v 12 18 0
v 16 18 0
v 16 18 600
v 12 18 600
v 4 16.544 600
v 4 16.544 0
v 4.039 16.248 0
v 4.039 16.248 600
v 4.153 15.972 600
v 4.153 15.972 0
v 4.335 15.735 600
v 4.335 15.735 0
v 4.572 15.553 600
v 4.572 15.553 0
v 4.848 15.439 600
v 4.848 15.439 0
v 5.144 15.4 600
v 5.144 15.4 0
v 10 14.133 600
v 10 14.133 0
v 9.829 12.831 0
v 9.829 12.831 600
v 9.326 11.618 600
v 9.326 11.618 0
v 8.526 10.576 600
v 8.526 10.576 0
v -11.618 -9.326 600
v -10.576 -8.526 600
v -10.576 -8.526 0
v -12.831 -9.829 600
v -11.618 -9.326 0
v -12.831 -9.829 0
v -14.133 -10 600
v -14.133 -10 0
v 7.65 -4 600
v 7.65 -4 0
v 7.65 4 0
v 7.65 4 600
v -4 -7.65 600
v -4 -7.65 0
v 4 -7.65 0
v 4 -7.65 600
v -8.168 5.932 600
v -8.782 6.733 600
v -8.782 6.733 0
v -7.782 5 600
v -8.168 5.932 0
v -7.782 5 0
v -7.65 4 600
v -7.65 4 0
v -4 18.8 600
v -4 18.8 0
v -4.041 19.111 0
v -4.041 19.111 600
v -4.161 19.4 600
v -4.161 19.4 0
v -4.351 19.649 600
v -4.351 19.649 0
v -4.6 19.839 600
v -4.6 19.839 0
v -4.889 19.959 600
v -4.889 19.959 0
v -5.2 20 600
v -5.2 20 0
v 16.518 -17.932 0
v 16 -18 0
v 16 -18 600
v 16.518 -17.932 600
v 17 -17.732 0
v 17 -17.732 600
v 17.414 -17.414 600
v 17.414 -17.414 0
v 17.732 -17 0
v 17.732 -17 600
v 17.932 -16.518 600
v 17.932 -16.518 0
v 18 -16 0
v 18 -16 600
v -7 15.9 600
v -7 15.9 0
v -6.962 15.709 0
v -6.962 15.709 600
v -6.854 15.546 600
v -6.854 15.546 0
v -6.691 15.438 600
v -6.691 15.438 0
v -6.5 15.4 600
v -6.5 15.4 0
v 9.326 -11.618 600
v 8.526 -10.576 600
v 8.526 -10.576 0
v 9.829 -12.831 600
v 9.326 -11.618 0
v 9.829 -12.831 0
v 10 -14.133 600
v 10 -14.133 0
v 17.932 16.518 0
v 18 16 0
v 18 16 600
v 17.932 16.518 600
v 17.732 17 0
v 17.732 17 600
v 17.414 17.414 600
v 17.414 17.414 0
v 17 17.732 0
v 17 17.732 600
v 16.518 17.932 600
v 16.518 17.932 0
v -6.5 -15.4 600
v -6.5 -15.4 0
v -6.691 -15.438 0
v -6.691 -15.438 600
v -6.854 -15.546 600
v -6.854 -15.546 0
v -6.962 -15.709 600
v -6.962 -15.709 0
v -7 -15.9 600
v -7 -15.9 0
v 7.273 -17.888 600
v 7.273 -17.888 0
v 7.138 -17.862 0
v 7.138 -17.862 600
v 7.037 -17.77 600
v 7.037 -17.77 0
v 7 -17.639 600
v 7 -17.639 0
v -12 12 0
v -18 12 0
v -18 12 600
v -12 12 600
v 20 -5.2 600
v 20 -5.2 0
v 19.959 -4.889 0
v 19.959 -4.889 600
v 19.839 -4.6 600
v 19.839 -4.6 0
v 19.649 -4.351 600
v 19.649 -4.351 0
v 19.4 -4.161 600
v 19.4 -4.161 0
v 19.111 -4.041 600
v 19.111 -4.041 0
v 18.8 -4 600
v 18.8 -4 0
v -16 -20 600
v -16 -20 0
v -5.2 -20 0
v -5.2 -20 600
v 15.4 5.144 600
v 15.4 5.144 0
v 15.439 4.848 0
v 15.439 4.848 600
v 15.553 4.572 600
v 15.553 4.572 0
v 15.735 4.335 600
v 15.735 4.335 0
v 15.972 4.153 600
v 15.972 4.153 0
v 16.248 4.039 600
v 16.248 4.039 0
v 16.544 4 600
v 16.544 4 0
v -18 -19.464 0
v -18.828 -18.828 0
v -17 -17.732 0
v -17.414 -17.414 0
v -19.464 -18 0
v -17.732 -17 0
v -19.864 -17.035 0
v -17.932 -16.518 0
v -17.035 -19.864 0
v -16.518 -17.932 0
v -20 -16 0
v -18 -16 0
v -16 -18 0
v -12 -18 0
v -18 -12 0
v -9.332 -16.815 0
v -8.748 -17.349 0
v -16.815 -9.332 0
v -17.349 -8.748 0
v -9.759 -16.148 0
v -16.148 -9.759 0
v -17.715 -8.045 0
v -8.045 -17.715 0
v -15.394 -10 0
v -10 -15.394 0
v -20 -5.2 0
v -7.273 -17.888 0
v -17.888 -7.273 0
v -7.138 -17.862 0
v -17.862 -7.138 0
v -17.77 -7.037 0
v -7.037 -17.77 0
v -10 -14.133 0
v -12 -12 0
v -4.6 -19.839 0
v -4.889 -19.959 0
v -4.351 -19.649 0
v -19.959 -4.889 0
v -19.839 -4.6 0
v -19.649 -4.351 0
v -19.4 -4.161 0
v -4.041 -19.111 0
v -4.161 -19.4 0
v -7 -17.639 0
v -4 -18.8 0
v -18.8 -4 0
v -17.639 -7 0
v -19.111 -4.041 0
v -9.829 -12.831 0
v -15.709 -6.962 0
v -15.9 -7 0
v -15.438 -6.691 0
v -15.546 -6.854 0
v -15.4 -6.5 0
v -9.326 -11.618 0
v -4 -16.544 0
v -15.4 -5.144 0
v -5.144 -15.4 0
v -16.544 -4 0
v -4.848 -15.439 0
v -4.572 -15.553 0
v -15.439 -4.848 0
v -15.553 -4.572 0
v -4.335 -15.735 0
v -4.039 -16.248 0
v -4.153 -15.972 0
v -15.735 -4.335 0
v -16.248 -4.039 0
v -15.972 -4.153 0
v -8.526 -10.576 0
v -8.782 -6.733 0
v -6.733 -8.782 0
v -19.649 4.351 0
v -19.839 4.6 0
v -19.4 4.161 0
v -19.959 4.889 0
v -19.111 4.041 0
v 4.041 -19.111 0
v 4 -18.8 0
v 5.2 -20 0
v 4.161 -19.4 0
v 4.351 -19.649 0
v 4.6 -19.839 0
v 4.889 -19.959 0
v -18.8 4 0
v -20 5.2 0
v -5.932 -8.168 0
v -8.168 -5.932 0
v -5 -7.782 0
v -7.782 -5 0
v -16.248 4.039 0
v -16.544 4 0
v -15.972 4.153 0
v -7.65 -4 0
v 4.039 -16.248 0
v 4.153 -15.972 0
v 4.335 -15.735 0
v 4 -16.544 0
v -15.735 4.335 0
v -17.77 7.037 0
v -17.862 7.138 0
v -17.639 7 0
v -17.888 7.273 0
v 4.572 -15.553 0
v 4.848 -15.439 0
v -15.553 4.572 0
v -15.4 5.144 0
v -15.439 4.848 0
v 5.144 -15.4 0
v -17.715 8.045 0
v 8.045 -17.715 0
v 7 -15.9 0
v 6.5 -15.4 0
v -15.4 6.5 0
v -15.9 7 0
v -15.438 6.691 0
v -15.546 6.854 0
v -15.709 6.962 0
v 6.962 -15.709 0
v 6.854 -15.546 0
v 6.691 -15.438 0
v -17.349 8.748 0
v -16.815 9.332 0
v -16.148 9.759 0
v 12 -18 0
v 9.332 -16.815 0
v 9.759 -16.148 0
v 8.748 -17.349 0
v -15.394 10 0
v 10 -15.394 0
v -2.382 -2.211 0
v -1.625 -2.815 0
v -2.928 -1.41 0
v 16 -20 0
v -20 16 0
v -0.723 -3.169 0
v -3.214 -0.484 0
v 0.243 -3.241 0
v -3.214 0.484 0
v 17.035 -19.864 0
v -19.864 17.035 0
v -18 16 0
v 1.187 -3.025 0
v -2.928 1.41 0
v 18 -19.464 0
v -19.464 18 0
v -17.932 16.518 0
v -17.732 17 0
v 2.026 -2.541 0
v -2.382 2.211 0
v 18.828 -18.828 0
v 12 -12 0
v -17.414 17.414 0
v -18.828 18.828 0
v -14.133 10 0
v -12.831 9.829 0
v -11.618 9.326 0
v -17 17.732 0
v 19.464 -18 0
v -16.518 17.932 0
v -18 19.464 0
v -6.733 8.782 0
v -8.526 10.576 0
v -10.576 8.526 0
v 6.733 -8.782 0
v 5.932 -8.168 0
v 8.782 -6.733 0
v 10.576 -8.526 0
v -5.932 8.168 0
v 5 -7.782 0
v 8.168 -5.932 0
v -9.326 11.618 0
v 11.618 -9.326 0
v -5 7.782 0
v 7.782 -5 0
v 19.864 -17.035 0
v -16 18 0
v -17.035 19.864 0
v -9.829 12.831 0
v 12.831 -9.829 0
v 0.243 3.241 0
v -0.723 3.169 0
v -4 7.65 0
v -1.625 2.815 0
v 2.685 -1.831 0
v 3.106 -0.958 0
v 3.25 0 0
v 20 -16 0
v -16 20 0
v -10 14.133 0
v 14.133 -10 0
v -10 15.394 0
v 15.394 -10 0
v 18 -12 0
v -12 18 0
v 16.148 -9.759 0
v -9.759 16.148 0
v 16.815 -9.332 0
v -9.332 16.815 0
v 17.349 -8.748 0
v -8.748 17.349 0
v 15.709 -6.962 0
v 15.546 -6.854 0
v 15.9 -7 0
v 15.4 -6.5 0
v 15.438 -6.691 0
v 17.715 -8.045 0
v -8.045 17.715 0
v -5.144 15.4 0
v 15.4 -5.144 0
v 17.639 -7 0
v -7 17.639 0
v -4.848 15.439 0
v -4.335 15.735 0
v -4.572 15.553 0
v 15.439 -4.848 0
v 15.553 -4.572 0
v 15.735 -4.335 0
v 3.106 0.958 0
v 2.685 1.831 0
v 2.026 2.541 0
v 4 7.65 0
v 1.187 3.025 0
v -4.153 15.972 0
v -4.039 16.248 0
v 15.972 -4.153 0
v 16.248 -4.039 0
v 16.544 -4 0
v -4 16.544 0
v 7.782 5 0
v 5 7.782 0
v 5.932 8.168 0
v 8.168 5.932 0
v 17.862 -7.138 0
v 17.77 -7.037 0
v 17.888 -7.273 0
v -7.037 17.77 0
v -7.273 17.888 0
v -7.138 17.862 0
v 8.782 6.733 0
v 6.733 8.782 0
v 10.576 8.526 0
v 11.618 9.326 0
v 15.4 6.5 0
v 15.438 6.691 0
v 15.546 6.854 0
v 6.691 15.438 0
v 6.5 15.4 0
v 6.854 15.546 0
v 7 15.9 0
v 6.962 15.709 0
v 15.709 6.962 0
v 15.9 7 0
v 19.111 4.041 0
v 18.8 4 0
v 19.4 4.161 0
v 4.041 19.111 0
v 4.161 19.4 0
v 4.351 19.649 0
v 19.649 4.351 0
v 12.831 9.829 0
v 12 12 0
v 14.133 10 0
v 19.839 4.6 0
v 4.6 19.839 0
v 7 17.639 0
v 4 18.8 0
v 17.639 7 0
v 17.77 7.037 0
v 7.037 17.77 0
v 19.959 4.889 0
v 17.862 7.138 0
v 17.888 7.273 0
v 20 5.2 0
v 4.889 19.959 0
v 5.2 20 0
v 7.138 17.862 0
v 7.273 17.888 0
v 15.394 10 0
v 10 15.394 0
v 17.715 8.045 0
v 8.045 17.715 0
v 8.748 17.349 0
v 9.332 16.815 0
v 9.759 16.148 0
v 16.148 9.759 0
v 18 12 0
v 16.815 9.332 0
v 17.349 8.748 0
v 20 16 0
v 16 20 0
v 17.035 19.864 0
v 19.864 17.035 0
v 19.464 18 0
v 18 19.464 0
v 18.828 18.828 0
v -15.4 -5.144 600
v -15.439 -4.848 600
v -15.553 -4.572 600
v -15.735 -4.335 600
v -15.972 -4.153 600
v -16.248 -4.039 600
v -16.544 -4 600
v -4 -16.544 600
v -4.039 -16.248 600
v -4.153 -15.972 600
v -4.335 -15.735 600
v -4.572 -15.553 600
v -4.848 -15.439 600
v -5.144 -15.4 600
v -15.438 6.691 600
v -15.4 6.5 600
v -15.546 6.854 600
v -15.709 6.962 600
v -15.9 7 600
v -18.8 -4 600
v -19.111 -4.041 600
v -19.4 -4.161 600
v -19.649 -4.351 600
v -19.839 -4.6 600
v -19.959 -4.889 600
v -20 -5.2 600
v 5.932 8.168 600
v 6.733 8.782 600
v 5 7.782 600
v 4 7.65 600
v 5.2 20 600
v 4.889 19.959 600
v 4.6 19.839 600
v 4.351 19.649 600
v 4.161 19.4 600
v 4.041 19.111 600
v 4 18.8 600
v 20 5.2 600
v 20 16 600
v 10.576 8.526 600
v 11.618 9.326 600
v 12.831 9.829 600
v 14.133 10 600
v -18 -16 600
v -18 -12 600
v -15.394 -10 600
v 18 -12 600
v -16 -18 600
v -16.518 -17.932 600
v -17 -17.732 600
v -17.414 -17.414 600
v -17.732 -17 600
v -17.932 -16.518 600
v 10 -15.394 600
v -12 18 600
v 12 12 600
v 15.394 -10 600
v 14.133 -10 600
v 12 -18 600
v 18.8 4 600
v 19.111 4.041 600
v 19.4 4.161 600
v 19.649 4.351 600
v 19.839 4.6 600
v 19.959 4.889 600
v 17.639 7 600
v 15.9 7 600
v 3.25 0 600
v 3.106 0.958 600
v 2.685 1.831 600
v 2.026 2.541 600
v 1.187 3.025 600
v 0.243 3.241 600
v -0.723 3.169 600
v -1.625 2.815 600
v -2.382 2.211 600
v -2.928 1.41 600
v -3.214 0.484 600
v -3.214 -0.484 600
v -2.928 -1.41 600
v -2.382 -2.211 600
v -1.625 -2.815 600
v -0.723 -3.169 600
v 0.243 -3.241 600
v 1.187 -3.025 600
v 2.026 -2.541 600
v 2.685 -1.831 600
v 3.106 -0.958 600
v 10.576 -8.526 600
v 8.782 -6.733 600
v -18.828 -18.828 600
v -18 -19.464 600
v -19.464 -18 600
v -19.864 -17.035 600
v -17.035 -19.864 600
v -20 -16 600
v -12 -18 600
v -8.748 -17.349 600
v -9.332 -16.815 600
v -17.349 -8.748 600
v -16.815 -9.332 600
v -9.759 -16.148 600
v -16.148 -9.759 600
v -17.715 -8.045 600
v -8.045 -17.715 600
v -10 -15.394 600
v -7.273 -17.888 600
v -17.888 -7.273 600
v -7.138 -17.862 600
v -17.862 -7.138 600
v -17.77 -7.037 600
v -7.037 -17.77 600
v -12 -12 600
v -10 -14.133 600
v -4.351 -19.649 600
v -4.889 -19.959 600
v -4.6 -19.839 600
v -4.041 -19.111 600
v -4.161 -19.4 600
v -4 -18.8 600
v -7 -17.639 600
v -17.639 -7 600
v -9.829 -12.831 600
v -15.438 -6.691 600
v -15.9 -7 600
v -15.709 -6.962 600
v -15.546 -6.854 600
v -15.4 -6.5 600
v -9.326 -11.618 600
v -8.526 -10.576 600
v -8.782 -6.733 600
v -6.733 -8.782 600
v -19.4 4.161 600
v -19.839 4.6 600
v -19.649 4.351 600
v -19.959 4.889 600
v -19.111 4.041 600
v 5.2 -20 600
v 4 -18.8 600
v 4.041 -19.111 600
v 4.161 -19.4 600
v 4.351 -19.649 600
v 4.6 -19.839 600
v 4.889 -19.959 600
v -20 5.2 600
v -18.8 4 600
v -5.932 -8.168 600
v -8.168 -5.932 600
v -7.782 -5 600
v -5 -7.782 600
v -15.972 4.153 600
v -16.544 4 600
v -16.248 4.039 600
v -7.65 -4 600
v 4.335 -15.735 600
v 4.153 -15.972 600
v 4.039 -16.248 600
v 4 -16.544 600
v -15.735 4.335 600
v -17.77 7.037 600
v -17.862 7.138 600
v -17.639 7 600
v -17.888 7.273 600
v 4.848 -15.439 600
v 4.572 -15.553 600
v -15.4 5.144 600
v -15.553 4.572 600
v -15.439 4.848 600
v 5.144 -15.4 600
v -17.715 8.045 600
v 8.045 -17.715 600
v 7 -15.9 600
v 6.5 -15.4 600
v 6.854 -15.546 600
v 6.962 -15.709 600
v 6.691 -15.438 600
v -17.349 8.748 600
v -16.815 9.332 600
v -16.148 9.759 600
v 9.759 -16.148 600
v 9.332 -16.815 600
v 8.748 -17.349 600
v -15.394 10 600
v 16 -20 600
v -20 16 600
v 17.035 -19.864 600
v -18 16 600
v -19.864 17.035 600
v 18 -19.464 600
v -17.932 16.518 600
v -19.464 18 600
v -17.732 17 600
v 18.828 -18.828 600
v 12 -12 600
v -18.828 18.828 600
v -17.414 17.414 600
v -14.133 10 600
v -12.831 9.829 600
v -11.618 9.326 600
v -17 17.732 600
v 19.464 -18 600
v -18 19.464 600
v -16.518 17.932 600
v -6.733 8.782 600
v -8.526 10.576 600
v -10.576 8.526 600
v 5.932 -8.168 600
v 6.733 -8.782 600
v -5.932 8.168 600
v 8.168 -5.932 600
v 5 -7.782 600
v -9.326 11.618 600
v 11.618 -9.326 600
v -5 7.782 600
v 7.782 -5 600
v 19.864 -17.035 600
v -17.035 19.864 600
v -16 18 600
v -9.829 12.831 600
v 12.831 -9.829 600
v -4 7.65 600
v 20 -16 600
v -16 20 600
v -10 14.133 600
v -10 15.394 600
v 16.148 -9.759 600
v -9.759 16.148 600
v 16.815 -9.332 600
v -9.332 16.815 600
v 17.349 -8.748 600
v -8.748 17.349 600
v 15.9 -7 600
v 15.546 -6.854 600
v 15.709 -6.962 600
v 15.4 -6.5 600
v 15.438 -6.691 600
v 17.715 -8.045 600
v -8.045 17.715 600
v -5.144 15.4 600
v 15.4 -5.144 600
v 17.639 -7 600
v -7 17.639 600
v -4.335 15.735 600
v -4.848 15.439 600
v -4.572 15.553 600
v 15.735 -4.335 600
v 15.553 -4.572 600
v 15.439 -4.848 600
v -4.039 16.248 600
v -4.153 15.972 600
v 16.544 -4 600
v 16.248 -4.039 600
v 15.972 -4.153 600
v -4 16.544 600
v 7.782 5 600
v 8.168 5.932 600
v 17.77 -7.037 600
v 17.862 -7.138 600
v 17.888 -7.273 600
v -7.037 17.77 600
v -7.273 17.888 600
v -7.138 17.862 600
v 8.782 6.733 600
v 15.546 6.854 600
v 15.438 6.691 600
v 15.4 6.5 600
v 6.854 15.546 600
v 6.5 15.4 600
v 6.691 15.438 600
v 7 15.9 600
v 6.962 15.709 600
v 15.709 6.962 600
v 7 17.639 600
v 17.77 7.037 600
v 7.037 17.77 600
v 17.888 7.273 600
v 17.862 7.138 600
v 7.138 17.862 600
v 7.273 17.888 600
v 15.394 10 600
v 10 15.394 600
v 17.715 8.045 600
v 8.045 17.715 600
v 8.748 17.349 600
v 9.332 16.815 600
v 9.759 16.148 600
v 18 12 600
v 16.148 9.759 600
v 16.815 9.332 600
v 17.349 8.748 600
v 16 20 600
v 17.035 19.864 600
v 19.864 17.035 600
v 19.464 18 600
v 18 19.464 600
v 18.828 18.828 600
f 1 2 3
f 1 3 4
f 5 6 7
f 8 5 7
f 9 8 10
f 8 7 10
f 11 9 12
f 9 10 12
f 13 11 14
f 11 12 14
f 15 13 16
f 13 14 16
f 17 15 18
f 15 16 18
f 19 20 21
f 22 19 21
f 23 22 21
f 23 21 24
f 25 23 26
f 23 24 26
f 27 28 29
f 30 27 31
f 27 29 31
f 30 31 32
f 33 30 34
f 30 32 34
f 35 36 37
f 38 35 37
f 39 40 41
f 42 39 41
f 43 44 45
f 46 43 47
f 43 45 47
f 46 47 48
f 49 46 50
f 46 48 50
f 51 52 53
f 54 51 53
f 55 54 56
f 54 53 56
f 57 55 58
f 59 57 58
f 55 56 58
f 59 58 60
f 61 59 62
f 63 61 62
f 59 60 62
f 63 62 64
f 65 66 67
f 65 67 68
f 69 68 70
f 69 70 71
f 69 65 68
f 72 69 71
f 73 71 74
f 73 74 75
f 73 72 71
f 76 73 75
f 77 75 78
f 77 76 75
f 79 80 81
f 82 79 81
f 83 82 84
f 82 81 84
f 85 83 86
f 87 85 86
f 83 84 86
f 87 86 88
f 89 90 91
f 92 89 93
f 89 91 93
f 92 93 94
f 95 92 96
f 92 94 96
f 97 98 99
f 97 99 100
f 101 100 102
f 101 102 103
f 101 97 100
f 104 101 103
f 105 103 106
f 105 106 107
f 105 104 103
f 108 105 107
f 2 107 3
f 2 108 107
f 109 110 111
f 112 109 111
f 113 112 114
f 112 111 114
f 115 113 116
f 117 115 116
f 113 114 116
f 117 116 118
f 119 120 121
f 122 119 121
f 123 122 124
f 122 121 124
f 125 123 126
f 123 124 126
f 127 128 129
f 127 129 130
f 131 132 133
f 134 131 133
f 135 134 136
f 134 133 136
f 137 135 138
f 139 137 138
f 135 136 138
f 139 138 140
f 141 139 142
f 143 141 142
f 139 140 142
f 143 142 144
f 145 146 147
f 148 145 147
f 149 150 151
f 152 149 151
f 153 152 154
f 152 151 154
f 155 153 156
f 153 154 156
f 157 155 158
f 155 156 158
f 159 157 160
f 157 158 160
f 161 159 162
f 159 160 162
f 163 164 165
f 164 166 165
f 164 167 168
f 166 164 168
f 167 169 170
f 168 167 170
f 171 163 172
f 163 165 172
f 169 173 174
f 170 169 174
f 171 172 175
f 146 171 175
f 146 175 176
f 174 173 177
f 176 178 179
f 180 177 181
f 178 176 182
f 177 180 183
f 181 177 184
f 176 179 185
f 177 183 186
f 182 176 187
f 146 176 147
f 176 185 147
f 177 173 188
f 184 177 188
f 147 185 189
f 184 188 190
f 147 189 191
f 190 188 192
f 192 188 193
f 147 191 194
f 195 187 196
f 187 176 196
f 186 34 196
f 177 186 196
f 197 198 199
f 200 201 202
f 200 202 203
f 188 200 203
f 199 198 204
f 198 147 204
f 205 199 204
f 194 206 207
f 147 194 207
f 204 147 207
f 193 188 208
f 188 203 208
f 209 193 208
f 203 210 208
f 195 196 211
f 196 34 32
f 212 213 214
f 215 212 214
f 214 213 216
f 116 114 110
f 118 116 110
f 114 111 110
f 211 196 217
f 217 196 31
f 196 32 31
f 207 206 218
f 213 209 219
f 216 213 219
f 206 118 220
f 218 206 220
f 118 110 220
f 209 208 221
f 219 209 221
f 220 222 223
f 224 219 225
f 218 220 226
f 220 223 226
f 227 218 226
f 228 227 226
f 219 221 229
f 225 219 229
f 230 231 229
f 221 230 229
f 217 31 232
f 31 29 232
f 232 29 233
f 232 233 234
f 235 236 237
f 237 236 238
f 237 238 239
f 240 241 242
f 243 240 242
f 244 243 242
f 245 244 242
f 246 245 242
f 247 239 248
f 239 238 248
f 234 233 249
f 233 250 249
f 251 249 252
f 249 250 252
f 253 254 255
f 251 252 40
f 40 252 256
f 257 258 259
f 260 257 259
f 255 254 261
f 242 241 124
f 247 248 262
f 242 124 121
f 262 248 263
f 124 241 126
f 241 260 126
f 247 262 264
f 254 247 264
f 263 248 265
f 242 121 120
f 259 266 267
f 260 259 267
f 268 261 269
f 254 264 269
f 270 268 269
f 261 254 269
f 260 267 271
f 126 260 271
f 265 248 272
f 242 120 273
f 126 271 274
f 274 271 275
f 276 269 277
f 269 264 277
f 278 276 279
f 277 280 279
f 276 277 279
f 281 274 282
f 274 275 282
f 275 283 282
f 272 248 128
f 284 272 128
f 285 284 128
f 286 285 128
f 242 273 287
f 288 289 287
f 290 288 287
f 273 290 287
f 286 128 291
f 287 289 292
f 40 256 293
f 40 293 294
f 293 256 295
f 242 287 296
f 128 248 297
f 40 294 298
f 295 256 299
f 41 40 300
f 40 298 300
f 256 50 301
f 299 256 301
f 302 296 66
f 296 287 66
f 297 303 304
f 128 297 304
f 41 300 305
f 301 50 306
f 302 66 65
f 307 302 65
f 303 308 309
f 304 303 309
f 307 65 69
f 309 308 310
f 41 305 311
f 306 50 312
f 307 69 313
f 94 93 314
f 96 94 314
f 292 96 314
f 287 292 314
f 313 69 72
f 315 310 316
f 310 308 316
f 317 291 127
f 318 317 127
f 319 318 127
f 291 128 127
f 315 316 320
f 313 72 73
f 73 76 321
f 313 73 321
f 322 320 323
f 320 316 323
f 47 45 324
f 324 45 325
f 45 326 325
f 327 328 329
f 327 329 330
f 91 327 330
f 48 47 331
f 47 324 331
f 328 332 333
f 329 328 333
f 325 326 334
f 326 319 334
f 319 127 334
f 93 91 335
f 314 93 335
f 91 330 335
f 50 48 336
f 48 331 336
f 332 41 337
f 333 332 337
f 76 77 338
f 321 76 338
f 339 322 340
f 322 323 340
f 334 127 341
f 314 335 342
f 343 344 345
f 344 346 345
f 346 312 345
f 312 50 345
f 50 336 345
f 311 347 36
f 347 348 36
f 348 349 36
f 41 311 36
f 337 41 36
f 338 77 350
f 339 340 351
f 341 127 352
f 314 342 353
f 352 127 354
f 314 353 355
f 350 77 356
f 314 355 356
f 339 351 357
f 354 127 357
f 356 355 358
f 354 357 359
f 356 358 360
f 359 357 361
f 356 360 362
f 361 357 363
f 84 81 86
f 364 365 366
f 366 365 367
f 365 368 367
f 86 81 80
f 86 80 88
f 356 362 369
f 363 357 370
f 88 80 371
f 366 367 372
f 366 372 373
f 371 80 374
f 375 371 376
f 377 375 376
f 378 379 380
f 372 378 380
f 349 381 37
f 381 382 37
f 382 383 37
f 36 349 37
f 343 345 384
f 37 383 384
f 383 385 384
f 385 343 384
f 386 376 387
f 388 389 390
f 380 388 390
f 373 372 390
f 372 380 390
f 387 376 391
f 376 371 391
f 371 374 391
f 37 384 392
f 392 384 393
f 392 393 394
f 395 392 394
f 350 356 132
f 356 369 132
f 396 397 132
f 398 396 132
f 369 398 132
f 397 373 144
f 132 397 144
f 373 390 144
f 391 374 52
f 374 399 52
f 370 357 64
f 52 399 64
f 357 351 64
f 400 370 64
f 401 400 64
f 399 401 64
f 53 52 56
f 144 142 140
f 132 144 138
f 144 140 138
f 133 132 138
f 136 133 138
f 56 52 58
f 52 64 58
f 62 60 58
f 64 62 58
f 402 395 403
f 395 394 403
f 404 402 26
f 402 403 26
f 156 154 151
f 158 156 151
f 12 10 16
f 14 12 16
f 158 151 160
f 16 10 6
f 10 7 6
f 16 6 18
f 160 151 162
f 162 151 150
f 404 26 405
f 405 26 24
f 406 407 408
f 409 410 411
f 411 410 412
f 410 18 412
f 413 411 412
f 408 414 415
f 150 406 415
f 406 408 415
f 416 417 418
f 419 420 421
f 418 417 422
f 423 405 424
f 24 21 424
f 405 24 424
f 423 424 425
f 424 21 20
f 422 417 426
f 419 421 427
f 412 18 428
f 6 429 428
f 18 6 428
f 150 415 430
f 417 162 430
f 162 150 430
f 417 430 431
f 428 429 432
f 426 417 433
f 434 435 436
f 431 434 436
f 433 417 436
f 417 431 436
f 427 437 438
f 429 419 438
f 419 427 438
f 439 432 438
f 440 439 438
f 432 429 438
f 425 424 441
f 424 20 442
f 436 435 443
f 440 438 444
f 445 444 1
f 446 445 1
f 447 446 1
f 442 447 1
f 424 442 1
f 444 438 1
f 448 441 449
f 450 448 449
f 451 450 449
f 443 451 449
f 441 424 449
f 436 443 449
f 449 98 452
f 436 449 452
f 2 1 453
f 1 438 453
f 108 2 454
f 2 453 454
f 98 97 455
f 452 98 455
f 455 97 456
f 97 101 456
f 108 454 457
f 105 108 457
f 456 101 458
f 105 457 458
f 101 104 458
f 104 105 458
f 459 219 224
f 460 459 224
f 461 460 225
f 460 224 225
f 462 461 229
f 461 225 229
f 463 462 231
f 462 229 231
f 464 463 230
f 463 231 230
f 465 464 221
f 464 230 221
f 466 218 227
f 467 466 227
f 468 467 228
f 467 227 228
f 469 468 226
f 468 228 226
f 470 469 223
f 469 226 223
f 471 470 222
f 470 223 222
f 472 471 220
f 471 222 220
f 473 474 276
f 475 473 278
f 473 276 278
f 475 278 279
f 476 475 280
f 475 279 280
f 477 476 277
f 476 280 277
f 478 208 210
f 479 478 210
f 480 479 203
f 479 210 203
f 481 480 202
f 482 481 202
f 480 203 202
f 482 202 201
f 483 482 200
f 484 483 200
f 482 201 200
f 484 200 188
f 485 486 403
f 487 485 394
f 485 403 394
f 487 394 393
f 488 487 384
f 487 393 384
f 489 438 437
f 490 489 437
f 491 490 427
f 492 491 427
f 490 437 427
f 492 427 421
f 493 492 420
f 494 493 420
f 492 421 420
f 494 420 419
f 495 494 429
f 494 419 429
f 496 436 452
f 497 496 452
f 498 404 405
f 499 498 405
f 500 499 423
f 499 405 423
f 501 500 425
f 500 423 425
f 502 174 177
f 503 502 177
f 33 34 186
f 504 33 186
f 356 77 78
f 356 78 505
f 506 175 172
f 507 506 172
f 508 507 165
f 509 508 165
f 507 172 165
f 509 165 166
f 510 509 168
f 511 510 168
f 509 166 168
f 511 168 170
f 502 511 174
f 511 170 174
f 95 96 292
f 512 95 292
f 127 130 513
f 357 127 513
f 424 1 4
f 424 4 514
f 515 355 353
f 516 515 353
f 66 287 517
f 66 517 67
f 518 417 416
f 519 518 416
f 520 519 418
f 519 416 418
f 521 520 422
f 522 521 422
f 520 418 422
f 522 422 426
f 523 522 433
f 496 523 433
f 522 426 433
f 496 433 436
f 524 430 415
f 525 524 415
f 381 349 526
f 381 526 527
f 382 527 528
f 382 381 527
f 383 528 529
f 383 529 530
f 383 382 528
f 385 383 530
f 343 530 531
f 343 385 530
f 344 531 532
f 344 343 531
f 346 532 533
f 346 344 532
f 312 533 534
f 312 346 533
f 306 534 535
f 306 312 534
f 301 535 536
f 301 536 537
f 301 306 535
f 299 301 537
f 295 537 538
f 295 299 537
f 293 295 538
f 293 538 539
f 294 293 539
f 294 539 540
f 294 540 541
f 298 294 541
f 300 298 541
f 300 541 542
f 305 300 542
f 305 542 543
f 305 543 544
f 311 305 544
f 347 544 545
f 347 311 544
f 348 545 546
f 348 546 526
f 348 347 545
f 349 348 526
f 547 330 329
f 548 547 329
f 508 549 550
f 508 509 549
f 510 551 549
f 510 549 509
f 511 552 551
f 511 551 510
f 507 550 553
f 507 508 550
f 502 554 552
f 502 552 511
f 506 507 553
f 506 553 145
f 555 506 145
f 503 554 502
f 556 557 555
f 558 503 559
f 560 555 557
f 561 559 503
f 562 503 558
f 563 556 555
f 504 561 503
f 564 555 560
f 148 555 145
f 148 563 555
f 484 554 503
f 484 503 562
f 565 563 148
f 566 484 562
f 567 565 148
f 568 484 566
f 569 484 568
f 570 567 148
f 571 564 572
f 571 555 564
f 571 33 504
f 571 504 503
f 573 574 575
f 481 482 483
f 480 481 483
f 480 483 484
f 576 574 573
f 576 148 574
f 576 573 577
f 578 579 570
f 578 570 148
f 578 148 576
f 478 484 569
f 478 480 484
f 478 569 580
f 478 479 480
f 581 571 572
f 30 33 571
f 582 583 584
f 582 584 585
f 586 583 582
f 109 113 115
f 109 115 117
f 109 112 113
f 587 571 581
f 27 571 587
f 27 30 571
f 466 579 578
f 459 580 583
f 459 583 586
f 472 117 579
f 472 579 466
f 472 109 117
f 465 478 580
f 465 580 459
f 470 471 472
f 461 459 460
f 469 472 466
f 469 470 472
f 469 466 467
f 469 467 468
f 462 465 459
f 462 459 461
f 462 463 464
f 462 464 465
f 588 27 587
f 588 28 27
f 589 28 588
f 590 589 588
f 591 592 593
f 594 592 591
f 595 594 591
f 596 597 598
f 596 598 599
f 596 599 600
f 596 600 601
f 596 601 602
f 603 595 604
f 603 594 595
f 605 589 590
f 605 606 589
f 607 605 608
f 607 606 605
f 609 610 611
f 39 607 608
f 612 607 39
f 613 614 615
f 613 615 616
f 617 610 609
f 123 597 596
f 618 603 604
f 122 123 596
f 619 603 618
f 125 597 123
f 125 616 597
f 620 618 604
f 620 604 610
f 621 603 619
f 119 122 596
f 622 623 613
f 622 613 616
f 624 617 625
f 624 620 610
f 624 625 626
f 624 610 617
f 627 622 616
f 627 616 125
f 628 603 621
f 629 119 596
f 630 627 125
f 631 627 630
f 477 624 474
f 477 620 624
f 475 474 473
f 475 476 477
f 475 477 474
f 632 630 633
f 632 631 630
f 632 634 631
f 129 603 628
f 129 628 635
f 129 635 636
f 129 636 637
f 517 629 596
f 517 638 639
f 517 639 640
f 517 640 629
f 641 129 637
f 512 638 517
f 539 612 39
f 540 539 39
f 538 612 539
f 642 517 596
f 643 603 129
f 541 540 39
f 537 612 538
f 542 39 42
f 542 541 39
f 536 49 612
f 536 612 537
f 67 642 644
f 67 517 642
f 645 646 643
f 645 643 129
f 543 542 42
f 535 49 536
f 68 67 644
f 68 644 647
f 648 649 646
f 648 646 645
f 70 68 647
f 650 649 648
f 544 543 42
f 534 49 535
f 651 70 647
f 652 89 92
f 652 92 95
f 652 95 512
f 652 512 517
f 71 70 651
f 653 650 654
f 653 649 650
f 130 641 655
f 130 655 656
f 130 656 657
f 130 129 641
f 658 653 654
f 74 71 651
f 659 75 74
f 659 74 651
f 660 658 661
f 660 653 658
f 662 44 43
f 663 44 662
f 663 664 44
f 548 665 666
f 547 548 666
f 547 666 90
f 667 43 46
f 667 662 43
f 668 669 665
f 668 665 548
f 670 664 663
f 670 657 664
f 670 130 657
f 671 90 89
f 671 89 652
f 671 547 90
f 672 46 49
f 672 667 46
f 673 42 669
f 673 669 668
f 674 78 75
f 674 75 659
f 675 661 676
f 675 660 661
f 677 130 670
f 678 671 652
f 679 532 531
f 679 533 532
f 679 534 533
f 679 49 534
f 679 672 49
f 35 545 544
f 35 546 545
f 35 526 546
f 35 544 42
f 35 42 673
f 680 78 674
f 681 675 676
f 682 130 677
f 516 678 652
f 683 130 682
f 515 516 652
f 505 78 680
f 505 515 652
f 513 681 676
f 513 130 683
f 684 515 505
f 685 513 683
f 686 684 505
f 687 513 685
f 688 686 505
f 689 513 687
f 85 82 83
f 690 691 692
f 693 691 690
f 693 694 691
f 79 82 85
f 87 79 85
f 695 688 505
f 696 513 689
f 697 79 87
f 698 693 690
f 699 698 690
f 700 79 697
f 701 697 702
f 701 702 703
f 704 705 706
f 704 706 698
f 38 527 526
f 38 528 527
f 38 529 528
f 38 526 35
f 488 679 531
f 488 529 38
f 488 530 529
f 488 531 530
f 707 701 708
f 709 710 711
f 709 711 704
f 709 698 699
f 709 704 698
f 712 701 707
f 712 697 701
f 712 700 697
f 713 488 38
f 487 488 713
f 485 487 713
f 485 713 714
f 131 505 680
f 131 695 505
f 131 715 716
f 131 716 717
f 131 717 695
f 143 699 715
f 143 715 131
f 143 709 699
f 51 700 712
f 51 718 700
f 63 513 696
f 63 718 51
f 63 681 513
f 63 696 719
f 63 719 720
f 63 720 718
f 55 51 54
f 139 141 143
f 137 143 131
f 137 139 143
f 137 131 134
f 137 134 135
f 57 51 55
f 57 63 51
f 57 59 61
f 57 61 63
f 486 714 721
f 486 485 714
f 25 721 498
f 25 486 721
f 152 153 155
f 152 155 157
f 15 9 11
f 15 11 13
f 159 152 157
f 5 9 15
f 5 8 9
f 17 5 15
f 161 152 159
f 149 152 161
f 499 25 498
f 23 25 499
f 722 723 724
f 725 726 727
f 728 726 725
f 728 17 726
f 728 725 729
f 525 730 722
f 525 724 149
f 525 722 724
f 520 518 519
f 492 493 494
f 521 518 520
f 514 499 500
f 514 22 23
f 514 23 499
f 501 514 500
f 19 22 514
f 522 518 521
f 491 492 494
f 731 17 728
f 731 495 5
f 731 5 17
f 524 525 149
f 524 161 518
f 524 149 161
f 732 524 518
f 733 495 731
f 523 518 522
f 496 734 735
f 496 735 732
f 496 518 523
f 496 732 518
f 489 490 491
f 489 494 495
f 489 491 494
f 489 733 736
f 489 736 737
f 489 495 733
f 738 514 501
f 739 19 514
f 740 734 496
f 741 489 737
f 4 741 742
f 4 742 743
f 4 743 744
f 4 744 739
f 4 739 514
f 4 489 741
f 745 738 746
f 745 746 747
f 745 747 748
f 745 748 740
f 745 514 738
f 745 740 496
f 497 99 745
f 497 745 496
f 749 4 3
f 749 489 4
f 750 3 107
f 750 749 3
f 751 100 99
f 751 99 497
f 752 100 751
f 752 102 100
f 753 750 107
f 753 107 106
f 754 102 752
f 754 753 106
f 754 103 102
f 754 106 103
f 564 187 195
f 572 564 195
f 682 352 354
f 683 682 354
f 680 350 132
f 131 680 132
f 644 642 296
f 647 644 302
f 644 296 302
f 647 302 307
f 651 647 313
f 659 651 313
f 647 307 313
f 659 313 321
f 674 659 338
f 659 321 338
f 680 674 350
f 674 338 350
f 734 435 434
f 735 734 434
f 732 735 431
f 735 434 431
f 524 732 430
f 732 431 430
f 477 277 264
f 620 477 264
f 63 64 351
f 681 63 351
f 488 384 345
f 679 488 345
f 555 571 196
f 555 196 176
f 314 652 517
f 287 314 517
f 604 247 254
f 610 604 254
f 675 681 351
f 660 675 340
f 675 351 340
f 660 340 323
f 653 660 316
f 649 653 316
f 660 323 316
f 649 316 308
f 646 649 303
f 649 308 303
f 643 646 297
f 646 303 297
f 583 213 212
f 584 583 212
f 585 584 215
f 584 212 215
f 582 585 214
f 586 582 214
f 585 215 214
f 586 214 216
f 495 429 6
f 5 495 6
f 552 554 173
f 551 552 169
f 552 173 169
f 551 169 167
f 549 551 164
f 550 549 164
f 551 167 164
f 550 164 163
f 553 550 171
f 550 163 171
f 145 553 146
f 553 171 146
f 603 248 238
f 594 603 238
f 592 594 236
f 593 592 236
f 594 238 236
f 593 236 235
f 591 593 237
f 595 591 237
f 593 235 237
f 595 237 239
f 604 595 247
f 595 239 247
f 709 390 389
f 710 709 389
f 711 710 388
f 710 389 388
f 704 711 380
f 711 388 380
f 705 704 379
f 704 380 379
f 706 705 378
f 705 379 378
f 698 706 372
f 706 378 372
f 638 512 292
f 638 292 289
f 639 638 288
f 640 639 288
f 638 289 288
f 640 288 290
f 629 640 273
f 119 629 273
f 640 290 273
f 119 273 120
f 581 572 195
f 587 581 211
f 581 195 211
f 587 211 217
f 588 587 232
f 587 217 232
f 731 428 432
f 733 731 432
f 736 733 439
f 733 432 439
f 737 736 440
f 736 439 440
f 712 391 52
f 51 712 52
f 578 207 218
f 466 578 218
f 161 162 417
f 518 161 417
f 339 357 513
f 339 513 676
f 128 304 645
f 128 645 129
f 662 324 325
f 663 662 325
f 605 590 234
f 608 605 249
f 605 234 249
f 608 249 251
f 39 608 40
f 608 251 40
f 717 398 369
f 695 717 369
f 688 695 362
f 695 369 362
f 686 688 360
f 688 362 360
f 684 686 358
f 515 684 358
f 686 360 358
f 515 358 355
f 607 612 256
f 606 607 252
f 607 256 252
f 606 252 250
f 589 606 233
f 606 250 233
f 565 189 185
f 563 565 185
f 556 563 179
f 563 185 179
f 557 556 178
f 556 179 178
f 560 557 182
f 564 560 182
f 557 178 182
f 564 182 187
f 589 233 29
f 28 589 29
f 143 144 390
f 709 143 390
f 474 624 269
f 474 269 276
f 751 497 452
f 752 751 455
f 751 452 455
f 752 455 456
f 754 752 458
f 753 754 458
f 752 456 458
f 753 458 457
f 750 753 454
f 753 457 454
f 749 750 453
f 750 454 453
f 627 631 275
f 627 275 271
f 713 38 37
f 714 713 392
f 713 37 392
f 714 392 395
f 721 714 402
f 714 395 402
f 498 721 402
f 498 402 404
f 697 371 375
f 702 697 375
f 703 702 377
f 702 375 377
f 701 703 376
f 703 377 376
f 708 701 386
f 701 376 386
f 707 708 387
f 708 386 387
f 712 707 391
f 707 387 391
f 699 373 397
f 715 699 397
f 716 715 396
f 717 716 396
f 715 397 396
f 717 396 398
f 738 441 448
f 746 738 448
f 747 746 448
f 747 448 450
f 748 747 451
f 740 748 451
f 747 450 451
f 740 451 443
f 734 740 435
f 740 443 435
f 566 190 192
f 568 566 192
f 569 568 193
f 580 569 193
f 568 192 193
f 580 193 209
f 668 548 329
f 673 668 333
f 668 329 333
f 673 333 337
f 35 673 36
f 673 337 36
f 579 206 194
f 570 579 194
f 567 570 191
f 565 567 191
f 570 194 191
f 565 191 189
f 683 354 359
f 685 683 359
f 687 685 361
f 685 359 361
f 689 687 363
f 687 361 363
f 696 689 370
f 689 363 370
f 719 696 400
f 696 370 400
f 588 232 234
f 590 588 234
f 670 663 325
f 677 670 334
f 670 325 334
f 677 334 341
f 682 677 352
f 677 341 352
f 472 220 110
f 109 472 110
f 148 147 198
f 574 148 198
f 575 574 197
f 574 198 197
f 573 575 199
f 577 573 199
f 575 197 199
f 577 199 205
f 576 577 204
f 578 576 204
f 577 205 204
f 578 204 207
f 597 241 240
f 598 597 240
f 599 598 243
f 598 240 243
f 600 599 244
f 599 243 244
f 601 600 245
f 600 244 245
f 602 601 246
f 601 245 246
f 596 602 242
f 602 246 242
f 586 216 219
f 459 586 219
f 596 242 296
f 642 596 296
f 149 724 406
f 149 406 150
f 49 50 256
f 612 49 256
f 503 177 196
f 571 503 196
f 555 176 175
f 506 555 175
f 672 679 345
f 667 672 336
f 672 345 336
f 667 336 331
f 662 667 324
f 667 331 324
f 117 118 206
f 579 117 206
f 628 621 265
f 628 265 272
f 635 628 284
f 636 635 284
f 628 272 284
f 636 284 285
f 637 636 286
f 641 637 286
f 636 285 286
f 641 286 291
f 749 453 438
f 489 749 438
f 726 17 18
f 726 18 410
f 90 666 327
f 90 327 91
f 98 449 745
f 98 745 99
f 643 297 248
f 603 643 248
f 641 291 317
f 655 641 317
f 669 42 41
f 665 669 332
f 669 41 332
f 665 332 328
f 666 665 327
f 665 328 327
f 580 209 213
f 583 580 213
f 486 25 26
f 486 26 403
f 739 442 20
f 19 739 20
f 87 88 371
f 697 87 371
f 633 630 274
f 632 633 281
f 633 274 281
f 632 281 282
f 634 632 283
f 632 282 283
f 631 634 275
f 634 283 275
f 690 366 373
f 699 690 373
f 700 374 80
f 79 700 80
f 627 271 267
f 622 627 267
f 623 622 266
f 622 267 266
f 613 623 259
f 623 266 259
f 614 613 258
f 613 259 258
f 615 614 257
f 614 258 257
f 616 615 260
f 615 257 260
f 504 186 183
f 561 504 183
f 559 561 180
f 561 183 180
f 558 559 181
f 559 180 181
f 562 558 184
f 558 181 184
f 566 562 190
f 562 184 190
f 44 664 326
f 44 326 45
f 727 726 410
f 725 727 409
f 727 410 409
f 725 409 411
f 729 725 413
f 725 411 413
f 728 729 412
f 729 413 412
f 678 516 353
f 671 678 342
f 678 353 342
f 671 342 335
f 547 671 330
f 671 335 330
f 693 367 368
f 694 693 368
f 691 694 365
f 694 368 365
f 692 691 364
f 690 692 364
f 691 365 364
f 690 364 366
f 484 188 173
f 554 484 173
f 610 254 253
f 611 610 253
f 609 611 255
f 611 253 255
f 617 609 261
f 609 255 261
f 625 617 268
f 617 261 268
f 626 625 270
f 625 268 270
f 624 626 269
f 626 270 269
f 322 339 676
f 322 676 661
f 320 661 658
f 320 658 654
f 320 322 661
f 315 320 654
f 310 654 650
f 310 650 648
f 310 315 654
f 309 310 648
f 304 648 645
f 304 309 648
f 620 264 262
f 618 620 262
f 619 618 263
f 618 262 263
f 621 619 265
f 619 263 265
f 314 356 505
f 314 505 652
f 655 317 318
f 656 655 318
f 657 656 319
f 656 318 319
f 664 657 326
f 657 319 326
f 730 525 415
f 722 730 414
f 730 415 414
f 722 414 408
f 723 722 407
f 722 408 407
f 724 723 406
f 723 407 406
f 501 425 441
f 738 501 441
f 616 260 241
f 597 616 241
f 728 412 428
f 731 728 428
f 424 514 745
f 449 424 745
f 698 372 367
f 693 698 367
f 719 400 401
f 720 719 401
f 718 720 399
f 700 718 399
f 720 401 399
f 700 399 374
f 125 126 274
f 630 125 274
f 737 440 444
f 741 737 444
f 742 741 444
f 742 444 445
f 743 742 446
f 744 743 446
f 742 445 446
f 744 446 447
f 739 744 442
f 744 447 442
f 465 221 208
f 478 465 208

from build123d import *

# Parameters (mm, degrees)
CROQUIS1_R              = 3.25
SALIENTE_EXTRUIR1_DEPTH = 600


with BuildPart() as part:
    # Croquis1 → Saliente-Extruir1 (new body)
    with BuildSketch(Plane.XY):
        with BuildLine():
            Line((17.638588183, 7.000000593), (15.9, 7.000000593))
            ThreePointArc((15.9, 7.000000593), (15.546446609, 6.853553983), (15.4, 6.500000593))
            Line((15.4, 6.500000593), (15.4, 5.144079725))
            ThreePointArc((15.4, 5.144079725), (15.735093193, 4.335093193), (16.544079725, 4))
            Line((16.544079725, 4), (18.8, 4))
            ThreePointArc((18.8, 4), (19.648528137, 4.351471863), (20, 5.2))
            Line((20, 5.2), (20, 16))
            ThreePointArc((20, 16), (18.828427125, 18.828427125), (16, 20))
            Line((16, 20), (5.2, 20))
            ThreePointArc((5.2, 20), (4.351471862, 19.648528137), (4, 18.8))
            Line((4, 18.8), (4, 16.544079725))
            ThreePointArc((4, 16.544079725), (4.335093193, 15.735093193), (5.144079725, 15.4))
            Line((5.144079725, 15.4), (6.500000593, 15.4))
            ThreePointArc((6.500000593, 15.4), (6.853553983, 15.546446609), (7.000000593, 15.9))
            Line((7.000000593, 15.9), (7.000000593, 17.638588183))
            ThreePointArc((7.000000593, 17.638588183), (7.081377983, 17.823253941), (7.272577483, 17.887802162))
            ThreePointArc((7.272577483, 17.887802162), (9.057180209, 17.101396285), (9.99999956, 15.394254591))
            Line((9.99999956, 15.394254591), (9.99999956, 14.133359942))
            ThreePointArc((9.99999956, 14.133359942), (9.617015406, 12.207968581), (8.52636881, 10.575700602))
            Line((8.52636881, 10.575700602), (6.732513057, 8.781844848))
            ThreePointArc((6.732513057, 8.781844848), (5.47882541, 7.944157544), (4, 7.650000881))
            Line((4, 7.650000881), (-3.999999119, 7.650000881))
            ThreePointArc((-3.999999119, 7.650000881), (-5.478824529, 7.944157544), (-6.732512176, 8.781844848))
            Line((-6.732512176, 8.781844848), (-8.526367489, 10.575700161))
            ThreePointArc((-8.526367489, 10.575700161), (-9.617014085, 12.207968141), (-9.999998238, 14.133359502))
            Line((-9.999998238, 14.133359502), (-9.999998238, 15.394254272))
            ThreePointArc((-9.999998238, 15.394254272), (-9.057177493, 17.101391964), (-7.272576853, 17.887795559))
            ThreePointArc((-7.272576853, 17.887795559), (-7.081377376, 17.823247322), (-7, 17.638581577))
            Line((-7, 17.638581577), (-7, 15.9))
            ThreePointArc((-7, 15.9), (-6.853553391, 15.546446609), (-6.5, 15.4))
            Line((-6.5, 15.4), (-5.144079725, 15.4))
            ThreePointArc((-5.144079725, 15.4), (-4.335093193, 15.735093193), (-4, 16.544079725))
            Line((-4, 16.544079725), (-4, 18.8))
            ThreePointArc((-4, 18.8), (-4.351471863, 19.648528137), (-5.2, 20))
            Line((-5.2, 20), (-16, 20))
            ThreePointArc((-16, 20), (-18.828427125, 18.828427125), (-20, 16))
            Line((-20, 16), (-20, 5.2))
            ThreePointArc((-20, 5.2), (-19.648528137, 4.351471862), (-18.8, 4))
            Line((-18.8, 4), (-16.544079725, 4))
            ThreePointArc((-16.544079725, 4), (-15.735093193, 4.335093193), (-15.4, 5.144079725))
            Line((-15.4, 5.144079725), (-15.4, 6.500000593))
            ThreePointArc((-15.4, 6.500000593), (-15.546446609, 6.853553983), (-15.9, 7.000000593))
            Line((-15.9, 7.000000593), (-17.638588183, 7.000000593))
            ThreePointArc((-17.638588183, 7.000000593), (-17.823253941, 7.081377983), (-17.887802162, 7.272577483))
            ThreePointArc((-17.887802162, 7.272577483), (-17.101396286, 9.057180209), (-15.394254591, 9.99999956))
            Line((-15.394254591, 9.99999956), (-14.133359942, 9.99999956))
            ThreePointArc((-14.133359942, 9.99999956), (-12.207968582, 9.617015406), (-10.575700602, 8.52636881))
            Line((-10.575700602, 8.52636881), (-8.781844848, 6.732513057))
            ThreePointArc((-8.781844848, 6.732513057), (-7.944157544, 5.47882541), (-7.650000881, 4))
            Line((-7.650000881, 4), (-7.650000881, -3.999999119))
            ThreePointArc((-7.650000881, -3.999999119), (-7.944157544, -5.478824529), (-8.781844848, -6.732512176))
            Line((-8.781844848, -6.732512176), (-10.575700161, -8.526367489))
            ThreePointArc((-10.575700161, -8.526367489), (-12.207968141, -9.617014085), (-14.133359502, -9.999998238))
            Line((-14.133359502, -9.999998238), (-15.394254272, -9.999998238))
            ThreePointArc((-15.394254272, -9.999998238), (-17.101391964, -9.057177493), (-17.887795559, -7.272576853))
            ThreePointArc((-17.887795559, -7.272576853), (-17.823247322, -7.081377376), (-17.638581577, -7))
            Line((-17.638581577, -7), (-15.9, -7))
            ThreePointArc((-15.9, -7), (-15.546446609, -6.853553391), (-15.4, -6.5))
            Line((-15.4, -6.5), (-15.4, -5.144079725))
            ThreePointArc((-15.4, -5.144079725), (-15.735093193, -4.335093193), (-16.544079725, -4))
            Line((-16.544079725, -4), (-18.8, -4))
            ThreePointArc((-18.8, -4), (-19.648528137, -4.351471863), (-20, -5.2))
            Line((-20, -5.2), (-20, -16))
            ThreePointArc((-20, -16), (-18.828427125, -18.828427125), (-16, -20))
            Line((-16, -20), (-5.2, -20))
            ThreePointArc((-5.2, -20), (-4.351471863, -19.648528137), (-4, -18.8))
            Line((-4, -18.8), (-4, -16.544079725))
            ThreePointArc((-4, -16.544079725), (-4.335093193, -15.735093193), (-5.144079725, -15.4))
            Line((-5.144079725, -15.4), (-6.5, -15.4))
            ThreePointArc((-6.5, -15.4), (-6.853553391, -15.546446609), (-7, -15.9))
            Line((-7, -15.9), (-7, -17.638581577))
            ThreePointArc((-7, -17.638581577), (-7.081377376, -17.823247322), (-7.272576853, -17.887795559))
            ThreePointArc((-7.272576853, -17.887795559), (-9.057177493, -17.101391964), (-9.999998238, -15.394254272))
            Line((-9.999998238, -15.394254272), (-9.999998238, -14.133359502))
            ThreePointArc((-9.999998238, -14.133359502), (-9.617014085, -12.207968141), (-8.526367489, -10.575700161))
            Line((-8.526367489, -10.575700161), (-6.732512176, -8.781844848))
            ThreePointArc((-6.732512176, -8.781844848), (-5.478824529, -7.944157544), (-3.999999119, -7.650000881))
            Line((-3.999999119, -7.650000881), (4, -7.650000881))
            ThreePointArc((4, -7.650000881), (5.47882541, -7.944157544), (6.732513057, -8.781844848))
            Line((6.732513057, -8.781844848), (8.52636881, -10.575700602))
            ThreePointArc((8.52636881, -10.575700602), (9.617015406, -12.207968582), (9.99999956, -14.133359942))
            Line((9.99999956, -14.133359942), (9.99999956, -15.394254591))
            ThreePointArc((9.99999956, -15.394254591), (9.057180209, -17.101396286), (7.272577483, -17.887802162))
            ThreePointArc((7.272577483, -17.887802162), (7.081377983, -17.823253941), (7.000000593, -17.638588183))
            Line((7.000000593, -17.638588183), (7.000000593, -15.9))
            ThreePointArc((7.000000593, -15.9), (6.853553983, -15.546446609), (6.500000593, -15.4))
            Line((6.500000593, -15.4), (5.144079725, -15.4))
            ThreePointArc((5.144079725, -15.4), (4.335093193, -15.735093193), (4, -16.544079725))
            Line((4, -16.544079725), (4, -18.8))
            ThreePointArc((4, -18.8), (4.351471862, -19.648528137), (5.2, -20))
            Line((5.2, -20), (16, -20))
            ThreePointArc((16, -20), (18.828427125, -18.828427125), (20, -16))
            Line((20, -16), (20, -5.2))
            ThreePointArc((20, -5.2), (19.648528137, -4.351471863), (18.8, -4))
            Line((18.8, -4), (16.544079725, -4))
            ThreePointArc((16.544079725, -4), (15.735093193, -4.335093193), (15.4, -5.144079725))
            Line((15.4, -5.144079725), (15.4, -6.5))
            ThreePointArc((15.4, -6.5), (15.546446609, -6.853553391), (15.9, -7))
            Line((15.9, -7), (17.638581577, -7))
            ThreePointArc((17.638581577, -7), (17.823247322, -7.081377376), (17.887795559, -7.272576853))
            ThreePointArc((17.887795559, -7.272576853), (17.101391964, -9.057177493), (15.394254272, -9.999998238))
            Line((15.394254272, -9.999998238), (14.133359502, -9.999998238))
            ThreePointArc((14.133359502, -9.999998238), (12.207968141, -9.617014085), (10.575700161, -8.526367489))
            Line((10.575700161, -8.526367489), (8.781844848, -6.732512176))
            ThreePointArc((8.781844848, -6.732512176), (7.944157544, -5.478824529), (7.650000881, -3.999999119))
            Line((7.650000881, -3.999999119), (7.650000881, 4))
            ThreePointArc((7.650000881, 4), (7.944157544, 5.47882541), (8.781844848, 6.732513057))
            Line((8.781844848, 6.732513057), (10.575700602, 8.52636881))
            ThreePointArc((10.575700602, 8.52636881), (12.207968581, 9.617015406), (14.133359942, 9.99999956))
            Line((14.133359942, 9.99999956), (15.394254591, 9.99999956))
            ThreePointArc((15.394254591, 9.99999956), (17.101396285, 9.057180209), (17.887802162, 7.272577483))
            ThreePointArc((17.887802162, 7.272577483), (17.823253941, 7.081377983), (17.638588183, 7.000000593))
        make_face()
        Circle(CROQUIS1_R, mode=Mode.SUBTRACT)
        with BuildLine():
            Line((-12, -18), (-16, -18))
            ThreePointArc((-16, -18), (-17.414213562, -17.414213562), (-18, -16))
            Line((-18, -16), (-18, -12))
            Line((-18, -12), (-12, -12))
            Line((-12, -12), (-12, -18))
        make_face(mode=Mode.SUBTRACT)
        with BuildLine():
            Line((18, -16), (18, -12))
            Line((18, -12), (12, -12))
            Line((12, -12), (12, -18))
            Line((12, -18), (16, -18))
            ThreePointArc((16, -18), (17.414213562, -17.414213562), (18, -16))
        make_face(mode=Mode.SUBTRACT)
        with BuildLine():
            Line((16, 18), (12, 18))
            Line((12, 18), (12, 12))
            Line((12, 12), (18, 12))
            Line((18, 12), (18, 16))
            ThreePointArc((18, 16), (17.414213562, 17.414213562), (16, 18))
        make_face(mode=Mode.SUBTRACT)
        with BuildLine():
            Line((-18, 16), (-18, 12))
            Line((-18, 12), (-12, 12))
            Line((-12, 12), (-12, 18))
            Line((-12, 18), (-16, 18))
            ThreePointArc((-16, 18), (-17.414213562, 17.414213562), (-18, 16))
        make_face(mode=Mode.SUBTRACT)
    extrude(amount=SALIENTE_EXTRUIR1_DEPTH)


solid = part.part
